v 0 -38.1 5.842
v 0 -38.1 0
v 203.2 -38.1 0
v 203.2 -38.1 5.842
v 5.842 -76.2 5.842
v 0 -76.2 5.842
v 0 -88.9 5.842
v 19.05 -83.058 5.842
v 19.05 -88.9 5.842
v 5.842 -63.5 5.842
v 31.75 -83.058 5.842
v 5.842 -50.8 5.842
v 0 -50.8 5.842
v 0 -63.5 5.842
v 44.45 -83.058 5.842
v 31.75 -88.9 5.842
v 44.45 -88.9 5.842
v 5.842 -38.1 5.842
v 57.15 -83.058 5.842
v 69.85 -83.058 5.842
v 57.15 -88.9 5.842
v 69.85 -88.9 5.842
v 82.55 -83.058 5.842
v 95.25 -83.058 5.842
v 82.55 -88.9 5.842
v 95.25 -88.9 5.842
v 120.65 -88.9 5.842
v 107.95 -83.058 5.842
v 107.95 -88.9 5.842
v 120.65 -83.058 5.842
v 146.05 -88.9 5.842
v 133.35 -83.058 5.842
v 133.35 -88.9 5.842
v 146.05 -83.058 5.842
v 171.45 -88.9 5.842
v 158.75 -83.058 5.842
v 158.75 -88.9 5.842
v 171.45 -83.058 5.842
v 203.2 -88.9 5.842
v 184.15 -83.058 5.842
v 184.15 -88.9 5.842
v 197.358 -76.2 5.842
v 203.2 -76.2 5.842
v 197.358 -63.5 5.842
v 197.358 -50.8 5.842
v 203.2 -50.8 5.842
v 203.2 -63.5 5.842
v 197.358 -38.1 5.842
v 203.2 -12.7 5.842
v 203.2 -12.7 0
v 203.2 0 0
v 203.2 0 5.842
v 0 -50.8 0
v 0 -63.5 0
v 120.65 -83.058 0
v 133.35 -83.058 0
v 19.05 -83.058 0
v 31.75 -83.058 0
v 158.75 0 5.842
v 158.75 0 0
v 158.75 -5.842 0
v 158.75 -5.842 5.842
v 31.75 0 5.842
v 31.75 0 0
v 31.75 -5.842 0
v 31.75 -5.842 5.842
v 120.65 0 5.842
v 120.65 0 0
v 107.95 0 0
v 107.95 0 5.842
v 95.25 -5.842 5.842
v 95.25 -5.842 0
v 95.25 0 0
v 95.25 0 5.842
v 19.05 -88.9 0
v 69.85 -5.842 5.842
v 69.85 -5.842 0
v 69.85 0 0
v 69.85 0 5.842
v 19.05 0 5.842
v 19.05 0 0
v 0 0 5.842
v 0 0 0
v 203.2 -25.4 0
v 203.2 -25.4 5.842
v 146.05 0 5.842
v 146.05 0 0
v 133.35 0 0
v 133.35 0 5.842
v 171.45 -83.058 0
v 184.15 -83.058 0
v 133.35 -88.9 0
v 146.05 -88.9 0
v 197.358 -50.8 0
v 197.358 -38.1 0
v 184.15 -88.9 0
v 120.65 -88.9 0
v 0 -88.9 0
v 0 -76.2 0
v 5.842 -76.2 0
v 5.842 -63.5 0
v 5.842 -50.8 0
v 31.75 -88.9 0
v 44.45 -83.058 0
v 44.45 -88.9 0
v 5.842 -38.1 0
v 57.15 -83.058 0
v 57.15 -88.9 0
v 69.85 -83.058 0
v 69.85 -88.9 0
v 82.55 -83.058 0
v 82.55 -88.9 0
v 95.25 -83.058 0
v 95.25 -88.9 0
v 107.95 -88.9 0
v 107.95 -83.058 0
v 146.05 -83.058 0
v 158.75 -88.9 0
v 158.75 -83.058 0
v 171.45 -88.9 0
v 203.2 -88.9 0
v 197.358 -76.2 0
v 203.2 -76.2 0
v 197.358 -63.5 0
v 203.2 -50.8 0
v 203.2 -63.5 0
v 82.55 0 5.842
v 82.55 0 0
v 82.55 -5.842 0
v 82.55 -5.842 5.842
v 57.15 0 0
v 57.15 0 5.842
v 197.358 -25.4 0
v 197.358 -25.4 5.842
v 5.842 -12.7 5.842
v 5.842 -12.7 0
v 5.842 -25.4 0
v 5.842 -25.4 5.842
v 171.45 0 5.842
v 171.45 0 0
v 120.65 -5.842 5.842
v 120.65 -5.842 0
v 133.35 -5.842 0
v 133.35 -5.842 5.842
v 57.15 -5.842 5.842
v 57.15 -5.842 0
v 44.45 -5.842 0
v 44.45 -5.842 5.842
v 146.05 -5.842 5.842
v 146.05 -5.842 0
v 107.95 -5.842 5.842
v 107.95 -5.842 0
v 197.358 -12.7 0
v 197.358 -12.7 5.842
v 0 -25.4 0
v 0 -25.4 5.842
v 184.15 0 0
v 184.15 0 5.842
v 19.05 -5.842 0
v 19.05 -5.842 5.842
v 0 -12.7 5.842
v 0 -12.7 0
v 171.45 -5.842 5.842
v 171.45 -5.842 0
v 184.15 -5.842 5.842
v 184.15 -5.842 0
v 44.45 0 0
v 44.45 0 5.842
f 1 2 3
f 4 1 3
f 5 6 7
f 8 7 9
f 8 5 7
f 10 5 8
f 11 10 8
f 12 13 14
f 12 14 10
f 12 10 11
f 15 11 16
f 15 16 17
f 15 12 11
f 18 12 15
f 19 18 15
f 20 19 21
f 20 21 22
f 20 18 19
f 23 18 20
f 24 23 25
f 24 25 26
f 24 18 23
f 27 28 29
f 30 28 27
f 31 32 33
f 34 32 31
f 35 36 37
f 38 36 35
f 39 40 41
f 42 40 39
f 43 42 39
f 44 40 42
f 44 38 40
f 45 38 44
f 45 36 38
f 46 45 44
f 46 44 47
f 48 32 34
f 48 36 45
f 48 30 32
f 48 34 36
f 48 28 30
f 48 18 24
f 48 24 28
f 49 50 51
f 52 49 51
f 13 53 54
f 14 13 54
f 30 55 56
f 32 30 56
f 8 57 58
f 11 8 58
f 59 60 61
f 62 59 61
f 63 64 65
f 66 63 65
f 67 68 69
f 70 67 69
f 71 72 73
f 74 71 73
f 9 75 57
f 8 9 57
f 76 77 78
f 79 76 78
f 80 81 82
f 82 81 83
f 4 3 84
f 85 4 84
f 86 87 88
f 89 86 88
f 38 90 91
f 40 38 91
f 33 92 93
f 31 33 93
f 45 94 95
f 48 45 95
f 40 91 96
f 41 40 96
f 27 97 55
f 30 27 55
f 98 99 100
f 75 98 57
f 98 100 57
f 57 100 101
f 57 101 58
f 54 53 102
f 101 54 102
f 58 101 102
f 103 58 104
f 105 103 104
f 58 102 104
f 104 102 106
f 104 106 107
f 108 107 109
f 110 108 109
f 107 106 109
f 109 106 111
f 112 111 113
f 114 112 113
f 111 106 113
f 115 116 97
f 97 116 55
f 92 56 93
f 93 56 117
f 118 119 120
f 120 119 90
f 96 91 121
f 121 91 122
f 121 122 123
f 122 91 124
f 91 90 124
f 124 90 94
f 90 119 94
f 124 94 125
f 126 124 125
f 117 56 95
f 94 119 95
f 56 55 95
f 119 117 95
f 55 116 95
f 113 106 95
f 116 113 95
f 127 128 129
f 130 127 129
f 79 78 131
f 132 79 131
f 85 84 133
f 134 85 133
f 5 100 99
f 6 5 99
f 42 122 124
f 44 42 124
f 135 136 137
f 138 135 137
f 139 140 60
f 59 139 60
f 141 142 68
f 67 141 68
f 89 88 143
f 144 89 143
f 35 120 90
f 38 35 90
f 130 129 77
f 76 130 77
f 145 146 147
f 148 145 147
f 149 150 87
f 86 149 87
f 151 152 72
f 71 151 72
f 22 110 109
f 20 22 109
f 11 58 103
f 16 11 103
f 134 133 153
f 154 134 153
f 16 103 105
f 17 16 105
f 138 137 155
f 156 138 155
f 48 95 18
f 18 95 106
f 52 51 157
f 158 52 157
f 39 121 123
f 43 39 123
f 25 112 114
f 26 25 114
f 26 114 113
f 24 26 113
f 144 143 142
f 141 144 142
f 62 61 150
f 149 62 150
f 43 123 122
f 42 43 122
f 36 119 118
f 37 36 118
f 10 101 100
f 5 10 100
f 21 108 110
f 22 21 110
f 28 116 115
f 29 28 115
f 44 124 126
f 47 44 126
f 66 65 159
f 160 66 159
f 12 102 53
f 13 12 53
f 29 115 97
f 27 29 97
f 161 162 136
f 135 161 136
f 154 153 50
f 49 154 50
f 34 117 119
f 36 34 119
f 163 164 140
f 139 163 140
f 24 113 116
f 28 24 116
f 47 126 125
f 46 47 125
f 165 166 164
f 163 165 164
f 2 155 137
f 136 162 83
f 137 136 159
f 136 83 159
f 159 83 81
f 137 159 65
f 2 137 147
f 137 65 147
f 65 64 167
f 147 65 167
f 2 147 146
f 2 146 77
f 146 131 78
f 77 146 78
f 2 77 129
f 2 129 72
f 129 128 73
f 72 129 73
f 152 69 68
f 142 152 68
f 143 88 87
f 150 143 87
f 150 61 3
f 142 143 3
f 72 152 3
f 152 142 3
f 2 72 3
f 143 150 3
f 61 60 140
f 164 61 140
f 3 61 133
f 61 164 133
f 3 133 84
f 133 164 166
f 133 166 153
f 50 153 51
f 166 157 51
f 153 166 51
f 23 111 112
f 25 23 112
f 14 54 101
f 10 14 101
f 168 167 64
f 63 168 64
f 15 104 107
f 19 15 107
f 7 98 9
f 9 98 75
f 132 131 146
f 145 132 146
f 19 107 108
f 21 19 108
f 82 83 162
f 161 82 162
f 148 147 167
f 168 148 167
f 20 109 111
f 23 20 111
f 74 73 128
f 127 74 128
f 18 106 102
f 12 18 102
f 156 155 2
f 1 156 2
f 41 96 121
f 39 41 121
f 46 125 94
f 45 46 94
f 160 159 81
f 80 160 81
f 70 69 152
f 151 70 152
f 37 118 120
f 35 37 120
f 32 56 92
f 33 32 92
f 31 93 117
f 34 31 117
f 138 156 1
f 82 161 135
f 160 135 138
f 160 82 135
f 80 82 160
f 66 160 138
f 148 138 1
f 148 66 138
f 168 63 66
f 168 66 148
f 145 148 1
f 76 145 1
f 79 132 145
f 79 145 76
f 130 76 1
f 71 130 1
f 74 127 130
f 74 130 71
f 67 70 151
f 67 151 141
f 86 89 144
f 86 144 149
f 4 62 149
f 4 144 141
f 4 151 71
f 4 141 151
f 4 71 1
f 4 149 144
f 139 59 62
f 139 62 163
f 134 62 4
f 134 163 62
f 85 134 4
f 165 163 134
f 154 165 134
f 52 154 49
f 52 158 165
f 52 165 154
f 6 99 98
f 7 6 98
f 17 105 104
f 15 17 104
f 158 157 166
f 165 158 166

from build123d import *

# Parameters (mm, degrees)
F1_DEPTH = 5.842
F2_DEPTH = 5.842


with BuildPart() as f1:
    # F0 (on Top) → F1 (new body)
    with BuildSketch(Plane.XY):
        Polygon((19.05, 0), (0, 0), (0, -12.7), (5.842, -12.7), (5.842, -25.4), (0, -25.4), (0, -38.1), (5.842, -38.1), (197.358, -38.1), (203.2, -38.1), (203.2, -25.4), (197.358, -25.4), (197.358, -12.7), (203.2, -12.7), (203.2, 0), (184.15, 0), (184.15, -5.842), (171.45, -5.842), (171.45, 0), (158.75, 0), (158.75, -5.842), (146.05, -5.842), (146.05, 0), (133.35, 0), (133.35, -5.842), (120.65, -5.842), (120.65, 0), (107.95, 0), (107.95, -5.842), (95.25, -5.842), (95.25, 0), (82.55, 0), (82.55, -5.842), (69.85, -5.842), (69.85, 0), (57.15, 0), (57.15, -5.842), (44.45, -5.842), (44.45, 0), (31.75, 0), (31.75, -5.842), (19.05, -5.842), align=None)
    extrude(amount=F1_DEPTH)


with BuildPart() as f2:
    # F0 (on Top) → F2 (new body)
    with BuildSketch(Plane.XY):
        Polygon((197.358, -38.1), (5.842, -38.1), (5.842, -50.8), (0, -50.8), (0, -63.5), (5.842, -63.5), (5.842, -76.2), (0, -76.2), (0, -88.9), (19.05, -88.9), (19.05, -83.058), (31.75, -83.058), (31.75, -88.9), (44.45, -88.9), (44.45, -83.058), (57.15, -83.058), (57.15, -88.9), (69.85, -88.9), (69.85, -83.058), (82.55, -83.058), (82.55, -88.9), (95.25, -88.9), (95.25, -83.058), (107.95, -83.058), (107.95, -88.9), (120.65, -88.9), (120.65, -83.058), (133.35, -83.058), (133.35, -88.9), (146.05, -88.9), (146.05, -83.058), (158.75, -83.058), (158.75, -88.9), (171.45, -88.9), (171.45, -83.058), (184.15, -83.058), (184.15, -88.9), (203.2, -88.9), (203.2, -76.2), (197.358, -76.2), (197.358, -63.5), (203.2, -63.5), (203.2, -50.8), (197.358, -50.8), align=None)
    extrude(amount=F2_DEPTH)


solid = Compound([f1.part, f2.part])
